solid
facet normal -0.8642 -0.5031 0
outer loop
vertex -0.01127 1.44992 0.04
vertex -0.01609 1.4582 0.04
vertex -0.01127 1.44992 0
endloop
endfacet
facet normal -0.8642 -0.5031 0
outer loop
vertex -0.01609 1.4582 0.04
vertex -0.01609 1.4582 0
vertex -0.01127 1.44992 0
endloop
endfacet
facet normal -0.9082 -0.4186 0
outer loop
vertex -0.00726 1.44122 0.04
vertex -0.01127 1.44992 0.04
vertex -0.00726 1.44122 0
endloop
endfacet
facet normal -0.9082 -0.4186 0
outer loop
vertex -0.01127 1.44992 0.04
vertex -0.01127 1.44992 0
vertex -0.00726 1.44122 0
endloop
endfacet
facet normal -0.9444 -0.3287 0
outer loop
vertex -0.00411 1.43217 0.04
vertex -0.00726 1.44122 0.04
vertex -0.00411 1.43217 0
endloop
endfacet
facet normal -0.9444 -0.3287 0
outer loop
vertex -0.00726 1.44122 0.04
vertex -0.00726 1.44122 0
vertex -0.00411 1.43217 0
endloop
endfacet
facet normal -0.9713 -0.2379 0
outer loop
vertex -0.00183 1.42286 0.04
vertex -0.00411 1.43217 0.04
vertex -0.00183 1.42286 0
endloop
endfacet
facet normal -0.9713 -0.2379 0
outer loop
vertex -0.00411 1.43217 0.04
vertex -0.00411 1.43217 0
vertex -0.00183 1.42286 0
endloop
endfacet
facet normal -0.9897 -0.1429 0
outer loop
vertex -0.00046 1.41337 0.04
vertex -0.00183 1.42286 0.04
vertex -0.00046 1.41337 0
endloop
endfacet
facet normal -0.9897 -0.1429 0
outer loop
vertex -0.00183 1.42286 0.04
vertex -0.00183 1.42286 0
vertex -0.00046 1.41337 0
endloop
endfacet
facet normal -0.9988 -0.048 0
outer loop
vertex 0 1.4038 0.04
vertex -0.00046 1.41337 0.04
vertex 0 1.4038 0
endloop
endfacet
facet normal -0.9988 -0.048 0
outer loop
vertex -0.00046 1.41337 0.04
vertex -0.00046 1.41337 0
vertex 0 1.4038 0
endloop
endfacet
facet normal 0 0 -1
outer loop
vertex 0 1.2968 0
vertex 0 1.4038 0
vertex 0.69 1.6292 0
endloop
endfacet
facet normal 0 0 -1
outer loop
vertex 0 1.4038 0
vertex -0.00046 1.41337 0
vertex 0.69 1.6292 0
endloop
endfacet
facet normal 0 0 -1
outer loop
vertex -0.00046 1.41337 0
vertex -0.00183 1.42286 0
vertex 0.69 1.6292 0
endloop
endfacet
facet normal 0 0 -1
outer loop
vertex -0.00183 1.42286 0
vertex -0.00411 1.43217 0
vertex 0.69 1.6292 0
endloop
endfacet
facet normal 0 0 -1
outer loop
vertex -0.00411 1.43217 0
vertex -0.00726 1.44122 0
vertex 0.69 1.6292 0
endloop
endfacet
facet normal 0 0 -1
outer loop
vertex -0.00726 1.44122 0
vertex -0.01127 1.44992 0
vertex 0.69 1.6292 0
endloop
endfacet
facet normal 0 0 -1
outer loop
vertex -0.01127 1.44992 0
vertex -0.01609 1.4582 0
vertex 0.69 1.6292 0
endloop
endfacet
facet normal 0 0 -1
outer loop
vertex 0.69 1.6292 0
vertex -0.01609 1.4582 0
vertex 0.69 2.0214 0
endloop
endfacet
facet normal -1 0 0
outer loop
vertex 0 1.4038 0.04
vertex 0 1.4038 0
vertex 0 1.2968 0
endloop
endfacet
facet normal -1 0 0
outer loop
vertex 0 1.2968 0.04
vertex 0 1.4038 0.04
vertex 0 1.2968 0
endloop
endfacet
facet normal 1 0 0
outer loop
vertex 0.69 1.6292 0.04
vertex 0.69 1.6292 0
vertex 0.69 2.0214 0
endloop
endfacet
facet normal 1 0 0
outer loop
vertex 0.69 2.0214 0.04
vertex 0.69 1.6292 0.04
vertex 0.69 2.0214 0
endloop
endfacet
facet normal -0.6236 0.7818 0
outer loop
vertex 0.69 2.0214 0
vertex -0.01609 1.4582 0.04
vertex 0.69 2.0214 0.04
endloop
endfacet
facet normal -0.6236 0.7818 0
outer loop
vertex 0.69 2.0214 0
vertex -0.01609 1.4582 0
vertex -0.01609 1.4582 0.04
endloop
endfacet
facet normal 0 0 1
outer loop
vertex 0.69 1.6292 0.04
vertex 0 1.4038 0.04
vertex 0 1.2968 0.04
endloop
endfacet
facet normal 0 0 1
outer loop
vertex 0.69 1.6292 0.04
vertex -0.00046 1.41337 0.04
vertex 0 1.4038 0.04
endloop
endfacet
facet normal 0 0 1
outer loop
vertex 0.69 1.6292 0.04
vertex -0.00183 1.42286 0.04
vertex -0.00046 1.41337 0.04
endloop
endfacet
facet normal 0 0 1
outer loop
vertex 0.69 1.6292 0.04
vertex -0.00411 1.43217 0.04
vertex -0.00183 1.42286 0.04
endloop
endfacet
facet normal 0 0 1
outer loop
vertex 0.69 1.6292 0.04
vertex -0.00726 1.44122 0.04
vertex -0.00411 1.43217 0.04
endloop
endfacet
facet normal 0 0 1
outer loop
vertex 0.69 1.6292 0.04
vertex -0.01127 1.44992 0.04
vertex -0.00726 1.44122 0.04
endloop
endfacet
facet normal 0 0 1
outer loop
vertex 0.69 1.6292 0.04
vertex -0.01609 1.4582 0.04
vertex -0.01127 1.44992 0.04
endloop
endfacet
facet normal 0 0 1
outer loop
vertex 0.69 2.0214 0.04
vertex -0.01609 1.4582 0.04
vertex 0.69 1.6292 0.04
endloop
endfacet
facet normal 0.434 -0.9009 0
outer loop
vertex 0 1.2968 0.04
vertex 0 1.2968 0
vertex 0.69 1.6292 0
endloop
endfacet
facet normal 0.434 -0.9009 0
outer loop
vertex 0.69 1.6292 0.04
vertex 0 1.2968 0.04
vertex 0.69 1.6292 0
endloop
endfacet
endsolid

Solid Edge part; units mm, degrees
sketch "Sketch1" plane through (0, 0, 0) normal (0, 0, 1) x (1, 0, 0)
  line L0 (0.69, 1.6292) -> (0.69, 2.0214)
  line L1 (-0.0161, 1.4582) -> (0.69, 2.0214)
  arc A0 (0, 1.4038) -> (-0.0161, 1.4582) centre (-0.1, 1.4038) ccw
  line L2 (0, 1.4038) -> (0, 1.2968)
  line L3 (0, 1.2968) -> (0.69, 1.6292)
extrude "Protrusion1" add sketch "Sketch1" along normal blind 0.04
